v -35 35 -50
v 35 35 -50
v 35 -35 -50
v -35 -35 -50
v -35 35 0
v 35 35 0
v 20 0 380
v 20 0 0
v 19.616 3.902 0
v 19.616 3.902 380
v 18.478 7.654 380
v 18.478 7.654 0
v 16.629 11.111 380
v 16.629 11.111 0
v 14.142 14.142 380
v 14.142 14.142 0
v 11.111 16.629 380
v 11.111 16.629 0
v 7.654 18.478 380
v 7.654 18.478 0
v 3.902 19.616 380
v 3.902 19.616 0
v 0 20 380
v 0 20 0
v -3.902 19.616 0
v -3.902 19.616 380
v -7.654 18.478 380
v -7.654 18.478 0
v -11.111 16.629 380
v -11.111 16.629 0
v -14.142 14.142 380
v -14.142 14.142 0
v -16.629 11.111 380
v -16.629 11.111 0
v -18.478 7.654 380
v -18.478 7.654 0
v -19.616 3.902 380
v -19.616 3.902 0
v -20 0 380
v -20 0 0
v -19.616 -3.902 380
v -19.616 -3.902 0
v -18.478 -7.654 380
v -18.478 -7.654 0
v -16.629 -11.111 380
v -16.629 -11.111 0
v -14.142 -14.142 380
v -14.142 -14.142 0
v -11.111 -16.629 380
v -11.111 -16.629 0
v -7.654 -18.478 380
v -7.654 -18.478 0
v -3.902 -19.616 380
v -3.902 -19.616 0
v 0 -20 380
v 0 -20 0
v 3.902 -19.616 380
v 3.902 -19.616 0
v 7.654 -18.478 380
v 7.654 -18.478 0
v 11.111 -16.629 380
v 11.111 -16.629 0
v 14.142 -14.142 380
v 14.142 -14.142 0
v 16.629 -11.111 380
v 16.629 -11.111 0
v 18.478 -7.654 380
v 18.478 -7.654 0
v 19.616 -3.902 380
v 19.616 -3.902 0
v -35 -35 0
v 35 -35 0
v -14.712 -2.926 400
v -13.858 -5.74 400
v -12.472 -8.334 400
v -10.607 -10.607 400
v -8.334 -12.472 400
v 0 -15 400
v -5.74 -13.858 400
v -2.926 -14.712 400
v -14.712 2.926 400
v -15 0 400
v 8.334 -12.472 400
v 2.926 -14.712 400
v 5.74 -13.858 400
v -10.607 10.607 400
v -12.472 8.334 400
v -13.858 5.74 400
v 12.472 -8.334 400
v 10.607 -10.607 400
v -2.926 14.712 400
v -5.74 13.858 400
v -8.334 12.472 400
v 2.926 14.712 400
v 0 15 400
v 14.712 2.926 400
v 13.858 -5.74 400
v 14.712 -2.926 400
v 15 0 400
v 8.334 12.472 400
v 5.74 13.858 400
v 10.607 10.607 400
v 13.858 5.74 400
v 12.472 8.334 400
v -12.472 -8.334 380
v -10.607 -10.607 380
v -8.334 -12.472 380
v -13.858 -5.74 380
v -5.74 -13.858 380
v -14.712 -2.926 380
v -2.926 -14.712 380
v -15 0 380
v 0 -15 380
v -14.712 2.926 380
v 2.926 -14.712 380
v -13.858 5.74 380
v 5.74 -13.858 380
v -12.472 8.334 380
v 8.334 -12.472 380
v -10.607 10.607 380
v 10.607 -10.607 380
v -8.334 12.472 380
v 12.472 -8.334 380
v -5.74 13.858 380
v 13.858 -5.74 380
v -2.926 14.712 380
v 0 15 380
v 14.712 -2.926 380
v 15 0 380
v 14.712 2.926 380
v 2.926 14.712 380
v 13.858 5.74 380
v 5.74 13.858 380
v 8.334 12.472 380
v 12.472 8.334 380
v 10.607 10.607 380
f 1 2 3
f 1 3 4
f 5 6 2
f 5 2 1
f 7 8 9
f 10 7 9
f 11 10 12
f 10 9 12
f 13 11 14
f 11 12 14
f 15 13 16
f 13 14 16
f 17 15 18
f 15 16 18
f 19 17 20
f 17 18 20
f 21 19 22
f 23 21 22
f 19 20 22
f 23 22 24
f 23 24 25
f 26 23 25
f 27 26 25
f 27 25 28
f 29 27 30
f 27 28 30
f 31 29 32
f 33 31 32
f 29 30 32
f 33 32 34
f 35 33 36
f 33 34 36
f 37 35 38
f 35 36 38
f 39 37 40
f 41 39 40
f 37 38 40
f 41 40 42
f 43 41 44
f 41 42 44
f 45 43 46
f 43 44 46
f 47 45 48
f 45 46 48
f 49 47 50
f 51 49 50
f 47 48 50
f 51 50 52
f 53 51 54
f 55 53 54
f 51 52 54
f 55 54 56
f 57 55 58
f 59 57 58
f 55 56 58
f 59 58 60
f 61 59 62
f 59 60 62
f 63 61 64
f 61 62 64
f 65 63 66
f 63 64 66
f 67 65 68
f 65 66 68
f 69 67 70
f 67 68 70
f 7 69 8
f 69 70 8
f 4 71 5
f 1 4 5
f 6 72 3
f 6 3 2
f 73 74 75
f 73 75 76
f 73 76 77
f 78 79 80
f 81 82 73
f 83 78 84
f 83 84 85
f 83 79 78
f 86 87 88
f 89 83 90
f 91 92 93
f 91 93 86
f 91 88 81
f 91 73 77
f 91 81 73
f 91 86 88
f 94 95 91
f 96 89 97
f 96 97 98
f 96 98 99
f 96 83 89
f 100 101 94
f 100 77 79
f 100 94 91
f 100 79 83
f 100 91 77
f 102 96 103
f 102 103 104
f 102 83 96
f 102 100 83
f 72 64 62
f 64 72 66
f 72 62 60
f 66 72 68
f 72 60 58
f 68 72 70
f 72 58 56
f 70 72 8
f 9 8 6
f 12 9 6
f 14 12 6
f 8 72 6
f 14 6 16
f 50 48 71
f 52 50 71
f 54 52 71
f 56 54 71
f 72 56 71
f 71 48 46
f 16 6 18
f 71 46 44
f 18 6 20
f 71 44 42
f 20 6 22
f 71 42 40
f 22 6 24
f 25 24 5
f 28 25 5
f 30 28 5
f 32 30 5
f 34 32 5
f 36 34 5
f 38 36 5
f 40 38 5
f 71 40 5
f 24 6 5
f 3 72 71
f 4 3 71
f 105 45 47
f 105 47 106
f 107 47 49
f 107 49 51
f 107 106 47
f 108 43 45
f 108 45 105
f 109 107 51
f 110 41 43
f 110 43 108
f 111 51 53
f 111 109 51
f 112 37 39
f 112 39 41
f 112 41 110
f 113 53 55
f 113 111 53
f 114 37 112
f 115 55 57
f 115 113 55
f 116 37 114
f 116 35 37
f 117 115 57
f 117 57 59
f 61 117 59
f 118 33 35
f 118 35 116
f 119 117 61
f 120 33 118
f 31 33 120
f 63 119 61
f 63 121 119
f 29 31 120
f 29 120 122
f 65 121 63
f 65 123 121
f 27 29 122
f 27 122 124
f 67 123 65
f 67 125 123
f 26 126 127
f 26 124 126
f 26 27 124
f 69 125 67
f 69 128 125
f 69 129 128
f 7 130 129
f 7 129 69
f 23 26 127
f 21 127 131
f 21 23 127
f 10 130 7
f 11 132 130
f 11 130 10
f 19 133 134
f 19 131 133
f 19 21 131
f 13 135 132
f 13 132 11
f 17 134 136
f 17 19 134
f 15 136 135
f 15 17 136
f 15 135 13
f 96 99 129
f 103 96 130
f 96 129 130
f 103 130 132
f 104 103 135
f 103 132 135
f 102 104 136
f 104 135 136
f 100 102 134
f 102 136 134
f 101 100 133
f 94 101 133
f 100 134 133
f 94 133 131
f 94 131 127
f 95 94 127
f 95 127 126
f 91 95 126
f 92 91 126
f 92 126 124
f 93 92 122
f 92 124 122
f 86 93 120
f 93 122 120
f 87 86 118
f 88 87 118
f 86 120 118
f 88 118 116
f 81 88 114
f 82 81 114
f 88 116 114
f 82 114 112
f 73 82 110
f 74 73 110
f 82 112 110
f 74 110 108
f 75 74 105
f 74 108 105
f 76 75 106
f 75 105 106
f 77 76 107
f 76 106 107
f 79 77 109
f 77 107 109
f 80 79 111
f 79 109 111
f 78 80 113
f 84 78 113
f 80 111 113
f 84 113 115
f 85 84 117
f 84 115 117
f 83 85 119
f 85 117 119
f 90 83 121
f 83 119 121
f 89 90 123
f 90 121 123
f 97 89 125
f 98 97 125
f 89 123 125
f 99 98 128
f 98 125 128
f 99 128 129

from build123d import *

# Parameters (mm, degrees)
SKETCH2_R           = 20
BOSS_EXTRUDE2_DEPTH = 380
SKETCH4_W           = 70
SKETCH4_H           = 70
BOSS_EXTRUDE3_DEPTH = 50
SKETCH5_R           = 15
BOSS_EXTRUDE4_DEPTH = 20


with BuildPart() as part:
    # Sketch2 → Boss-Extrude2 (new body)
    with BuildSketch(Plane.XY):
        Circle(SKETCH2_R)
    extrude(amount=BOSS_EXTRUDE2_DEPTH)

    # Sketch4 → Boss-Extrude3 (add)
    with BuildSketch(Plane(origin=(0, 0, 0), x_dir=(-1, 0, 0), z_dir=(0, 0, -1))):
        Rectangle(SKETCH4_W, SKETCH4_H)
    extrude(amount=BOSS_EXTRUDE3_DEPTH)

    # Sketch5 → Boss-Extrude4 (add)
    with BuildSketch(Plane.XY.offset(380)):
        Circle(SKETCH5_R)
    extrude(amount=BOSS_EXTRUDE4_DEPTH)


solid = part.part
